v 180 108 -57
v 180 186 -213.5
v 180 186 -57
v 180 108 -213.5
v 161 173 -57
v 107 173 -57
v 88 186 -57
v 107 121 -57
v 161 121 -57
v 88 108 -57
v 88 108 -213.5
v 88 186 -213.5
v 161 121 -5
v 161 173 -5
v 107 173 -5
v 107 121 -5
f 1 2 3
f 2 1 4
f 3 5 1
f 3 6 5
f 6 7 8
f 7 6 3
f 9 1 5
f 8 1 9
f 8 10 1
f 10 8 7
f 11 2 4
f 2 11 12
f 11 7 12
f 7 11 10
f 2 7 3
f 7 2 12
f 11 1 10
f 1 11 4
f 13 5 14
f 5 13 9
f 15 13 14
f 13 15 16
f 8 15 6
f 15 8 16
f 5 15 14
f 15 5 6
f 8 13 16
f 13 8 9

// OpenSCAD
union(){
    cube(size=[0, 0, 0]);
    translate(v=[134.0, 147.0, -135.25]){
        translate(v=[-46.0, -39.0, -78.25]){
            cube(size=[92.0, 78.0, 156.5]);
        };
    };
    translate(v=[134.0, 147.0, -31.25]){
        translate(v=[-27.0, -26.0, -26.25]){
            cube(size=[54.0, 52.0, 52.5]);
        };
    };
};
